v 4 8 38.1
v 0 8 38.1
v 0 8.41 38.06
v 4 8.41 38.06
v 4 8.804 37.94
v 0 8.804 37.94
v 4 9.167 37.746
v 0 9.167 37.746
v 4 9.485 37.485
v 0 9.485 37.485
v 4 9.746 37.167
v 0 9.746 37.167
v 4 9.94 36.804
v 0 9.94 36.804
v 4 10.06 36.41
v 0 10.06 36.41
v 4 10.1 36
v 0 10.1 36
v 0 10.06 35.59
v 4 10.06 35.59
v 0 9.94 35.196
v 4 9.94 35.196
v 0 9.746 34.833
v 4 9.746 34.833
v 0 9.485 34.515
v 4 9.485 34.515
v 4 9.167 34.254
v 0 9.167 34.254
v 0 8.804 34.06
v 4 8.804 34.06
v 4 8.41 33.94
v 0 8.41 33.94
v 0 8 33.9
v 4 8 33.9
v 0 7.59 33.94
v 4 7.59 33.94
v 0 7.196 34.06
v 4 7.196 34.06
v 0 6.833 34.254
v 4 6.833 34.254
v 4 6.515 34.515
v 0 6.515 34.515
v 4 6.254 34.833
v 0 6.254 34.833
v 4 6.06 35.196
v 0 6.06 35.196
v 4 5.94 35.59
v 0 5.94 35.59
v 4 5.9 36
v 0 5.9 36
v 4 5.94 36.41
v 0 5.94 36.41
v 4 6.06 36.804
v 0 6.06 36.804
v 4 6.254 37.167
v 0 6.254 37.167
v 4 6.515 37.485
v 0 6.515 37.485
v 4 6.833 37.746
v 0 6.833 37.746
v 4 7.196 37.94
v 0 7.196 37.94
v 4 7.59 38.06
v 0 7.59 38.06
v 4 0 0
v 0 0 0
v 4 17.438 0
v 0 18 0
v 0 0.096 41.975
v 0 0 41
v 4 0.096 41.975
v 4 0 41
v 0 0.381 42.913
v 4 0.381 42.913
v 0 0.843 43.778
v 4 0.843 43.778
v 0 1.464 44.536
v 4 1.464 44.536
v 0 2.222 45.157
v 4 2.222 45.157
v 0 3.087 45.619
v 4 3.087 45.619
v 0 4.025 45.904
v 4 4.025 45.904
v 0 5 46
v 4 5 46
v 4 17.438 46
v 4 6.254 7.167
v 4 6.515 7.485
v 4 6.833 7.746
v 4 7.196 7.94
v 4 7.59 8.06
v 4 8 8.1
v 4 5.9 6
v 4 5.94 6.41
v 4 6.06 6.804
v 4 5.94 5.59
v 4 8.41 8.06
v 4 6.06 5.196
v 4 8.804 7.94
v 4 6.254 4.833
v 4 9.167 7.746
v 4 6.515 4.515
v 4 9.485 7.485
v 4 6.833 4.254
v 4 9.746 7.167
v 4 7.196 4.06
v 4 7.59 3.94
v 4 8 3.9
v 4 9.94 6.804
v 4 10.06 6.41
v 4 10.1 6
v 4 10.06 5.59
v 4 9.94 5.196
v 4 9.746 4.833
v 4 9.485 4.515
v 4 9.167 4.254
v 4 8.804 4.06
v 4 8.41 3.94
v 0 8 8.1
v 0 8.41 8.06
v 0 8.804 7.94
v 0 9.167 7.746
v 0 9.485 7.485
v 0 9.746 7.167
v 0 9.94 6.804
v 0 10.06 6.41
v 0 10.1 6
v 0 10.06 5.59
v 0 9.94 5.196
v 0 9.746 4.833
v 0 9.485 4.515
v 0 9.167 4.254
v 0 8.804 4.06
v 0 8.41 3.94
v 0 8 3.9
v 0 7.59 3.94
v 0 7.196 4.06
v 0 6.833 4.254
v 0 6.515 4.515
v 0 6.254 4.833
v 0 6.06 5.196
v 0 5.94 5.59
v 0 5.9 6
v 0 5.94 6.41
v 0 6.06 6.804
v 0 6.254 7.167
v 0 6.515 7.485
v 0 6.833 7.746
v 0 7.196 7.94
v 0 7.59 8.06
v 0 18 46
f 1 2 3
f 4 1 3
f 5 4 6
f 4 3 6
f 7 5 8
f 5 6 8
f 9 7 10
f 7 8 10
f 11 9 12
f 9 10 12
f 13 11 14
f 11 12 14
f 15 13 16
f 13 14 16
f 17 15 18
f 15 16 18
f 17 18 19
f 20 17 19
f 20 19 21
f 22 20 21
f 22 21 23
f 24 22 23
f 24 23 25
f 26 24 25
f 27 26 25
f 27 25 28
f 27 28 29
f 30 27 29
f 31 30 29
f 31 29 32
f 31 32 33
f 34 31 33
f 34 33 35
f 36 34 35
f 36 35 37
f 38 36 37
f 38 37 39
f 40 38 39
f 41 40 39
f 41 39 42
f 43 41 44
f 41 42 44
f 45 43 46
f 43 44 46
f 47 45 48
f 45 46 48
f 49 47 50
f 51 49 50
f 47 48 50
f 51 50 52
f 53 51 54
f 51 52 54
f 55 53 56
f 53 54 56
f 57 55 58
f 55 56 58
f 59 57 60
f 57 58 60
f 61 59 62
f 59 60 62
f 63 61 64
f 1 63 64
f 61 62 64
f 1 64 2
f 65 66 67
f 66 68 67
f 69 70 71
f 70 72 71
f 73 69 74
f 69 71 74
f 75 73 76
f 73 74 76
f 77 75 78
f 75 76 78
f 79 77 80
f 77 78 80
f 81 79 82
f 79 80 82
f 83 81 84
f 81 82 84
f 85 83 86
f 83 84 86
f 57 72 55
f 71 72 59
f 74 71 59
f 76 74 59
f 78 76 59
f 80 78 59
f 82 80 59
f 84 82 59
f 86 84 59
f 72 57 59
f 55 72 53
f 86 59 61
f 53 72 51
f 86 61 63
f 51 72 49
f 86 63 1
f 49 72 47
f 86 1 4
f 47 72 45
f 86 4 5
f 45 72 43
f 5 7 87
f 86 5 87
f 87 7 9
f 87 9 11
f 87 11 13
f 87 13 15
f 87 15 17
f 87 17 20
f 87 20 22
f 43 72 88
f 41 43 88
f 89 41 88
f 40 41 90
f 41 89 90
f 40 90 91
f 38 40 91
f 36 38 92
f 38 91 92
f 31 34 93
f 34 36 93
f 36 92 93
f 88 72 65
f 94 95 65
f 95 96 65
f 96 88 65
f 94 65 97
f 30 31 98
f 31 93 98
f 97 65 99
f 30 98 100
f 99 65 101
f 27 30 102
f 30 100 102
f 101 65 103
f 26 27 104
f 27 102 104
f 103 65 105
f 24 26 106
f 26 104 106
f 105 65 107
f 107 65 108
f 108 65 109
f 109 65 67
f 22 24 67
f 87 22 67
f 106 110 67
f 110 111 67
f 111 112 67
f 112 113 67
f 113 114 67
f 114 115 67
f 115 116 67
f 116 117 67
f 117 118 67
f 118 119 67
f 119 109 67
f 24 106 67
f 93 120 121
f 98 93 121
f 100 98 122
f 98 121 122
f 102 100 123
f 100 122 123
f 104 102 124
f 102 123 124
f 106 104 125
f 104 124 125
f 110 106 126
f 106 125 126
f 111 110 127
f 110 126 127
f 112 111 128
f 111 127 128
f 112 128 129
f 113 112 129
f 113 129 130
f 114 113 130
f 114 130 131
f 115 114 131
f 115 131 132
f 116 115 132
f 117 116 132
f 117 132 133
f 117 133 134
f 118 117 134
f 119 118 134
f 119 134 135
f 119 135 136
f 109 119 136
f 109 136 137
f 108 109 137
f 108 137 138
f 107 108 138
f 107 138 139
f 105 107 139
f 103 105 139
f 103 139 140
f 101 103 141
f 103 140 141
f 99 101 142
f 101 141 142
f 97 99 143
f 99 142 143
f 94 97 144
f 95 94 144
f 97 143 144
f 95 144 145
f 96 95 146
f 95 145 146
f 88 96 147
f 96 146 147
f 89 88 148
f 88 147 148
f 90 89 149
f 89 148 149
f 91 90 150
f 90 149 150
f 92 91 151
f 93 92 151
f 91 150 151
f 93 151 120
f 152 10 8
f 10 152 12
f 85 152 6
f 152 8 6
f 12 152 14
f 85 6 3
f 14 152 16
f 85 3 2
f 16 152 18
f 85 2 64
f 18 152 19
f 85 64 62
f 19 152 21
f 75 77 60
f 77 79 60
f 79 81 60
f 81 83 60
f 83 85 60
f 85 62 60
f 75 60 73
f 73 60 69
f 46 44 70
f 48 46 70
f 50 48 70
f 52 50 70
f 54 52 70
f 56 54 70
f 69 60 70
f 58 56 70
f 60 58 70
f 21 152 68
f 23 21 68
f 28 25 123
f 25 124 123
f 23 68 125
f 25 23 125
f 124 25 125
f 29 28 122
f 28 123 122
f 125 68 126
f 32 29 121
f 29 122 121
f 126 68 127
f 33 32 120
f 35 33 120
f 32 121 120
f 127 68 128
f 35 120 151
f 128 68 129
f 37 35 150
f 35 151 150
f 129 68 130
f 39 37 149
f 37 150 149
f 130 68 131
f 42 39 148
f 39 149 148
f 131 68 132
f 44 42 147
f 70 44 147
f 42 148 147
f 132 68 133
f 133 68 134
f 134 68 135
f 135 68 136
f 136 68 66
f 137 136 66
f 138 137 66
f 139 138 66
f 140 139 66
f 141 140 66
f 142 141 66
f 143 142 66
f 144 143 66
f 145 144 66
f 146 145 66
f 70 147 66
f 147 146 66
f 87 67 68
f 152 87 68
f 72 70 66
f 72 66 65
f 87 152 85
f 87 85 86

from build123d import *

# Parameters (mm, degrees)
EXTRUSION1_DEPTH  = 46
CONG_1_R          = 5
TROU_TARAUD_M51_D = 4.2


with BuildPart() as part:
    # Esquisse1 → Extrusion1 (new body)
    with BuildSketch(Plane.XY):
        Polygon((0, 0), (4, 0), (4, 17.437836661), (0, 18), align=None)
    extrude(amount=EXTRUSION1_DEPTH)

    # Congé1
    cong_1_edges = [part.edges().sort_by_distance(p)[0] for p in [
        (2, 0, 46),
    ]]
    fillet(cong_1_edges, radius=CONG_1_R)

    # Trou taraudé M51 (through all)
    with Locations(Plane(origin=(4, 0, 0), x_dir=(0, 0, -1), z_dir=(1, 0, 0))):
        with Locations((-6, 8), (-36, 8)):
            Hole(TROU_TARAUD_M51_D / 2)


solid = part.part
